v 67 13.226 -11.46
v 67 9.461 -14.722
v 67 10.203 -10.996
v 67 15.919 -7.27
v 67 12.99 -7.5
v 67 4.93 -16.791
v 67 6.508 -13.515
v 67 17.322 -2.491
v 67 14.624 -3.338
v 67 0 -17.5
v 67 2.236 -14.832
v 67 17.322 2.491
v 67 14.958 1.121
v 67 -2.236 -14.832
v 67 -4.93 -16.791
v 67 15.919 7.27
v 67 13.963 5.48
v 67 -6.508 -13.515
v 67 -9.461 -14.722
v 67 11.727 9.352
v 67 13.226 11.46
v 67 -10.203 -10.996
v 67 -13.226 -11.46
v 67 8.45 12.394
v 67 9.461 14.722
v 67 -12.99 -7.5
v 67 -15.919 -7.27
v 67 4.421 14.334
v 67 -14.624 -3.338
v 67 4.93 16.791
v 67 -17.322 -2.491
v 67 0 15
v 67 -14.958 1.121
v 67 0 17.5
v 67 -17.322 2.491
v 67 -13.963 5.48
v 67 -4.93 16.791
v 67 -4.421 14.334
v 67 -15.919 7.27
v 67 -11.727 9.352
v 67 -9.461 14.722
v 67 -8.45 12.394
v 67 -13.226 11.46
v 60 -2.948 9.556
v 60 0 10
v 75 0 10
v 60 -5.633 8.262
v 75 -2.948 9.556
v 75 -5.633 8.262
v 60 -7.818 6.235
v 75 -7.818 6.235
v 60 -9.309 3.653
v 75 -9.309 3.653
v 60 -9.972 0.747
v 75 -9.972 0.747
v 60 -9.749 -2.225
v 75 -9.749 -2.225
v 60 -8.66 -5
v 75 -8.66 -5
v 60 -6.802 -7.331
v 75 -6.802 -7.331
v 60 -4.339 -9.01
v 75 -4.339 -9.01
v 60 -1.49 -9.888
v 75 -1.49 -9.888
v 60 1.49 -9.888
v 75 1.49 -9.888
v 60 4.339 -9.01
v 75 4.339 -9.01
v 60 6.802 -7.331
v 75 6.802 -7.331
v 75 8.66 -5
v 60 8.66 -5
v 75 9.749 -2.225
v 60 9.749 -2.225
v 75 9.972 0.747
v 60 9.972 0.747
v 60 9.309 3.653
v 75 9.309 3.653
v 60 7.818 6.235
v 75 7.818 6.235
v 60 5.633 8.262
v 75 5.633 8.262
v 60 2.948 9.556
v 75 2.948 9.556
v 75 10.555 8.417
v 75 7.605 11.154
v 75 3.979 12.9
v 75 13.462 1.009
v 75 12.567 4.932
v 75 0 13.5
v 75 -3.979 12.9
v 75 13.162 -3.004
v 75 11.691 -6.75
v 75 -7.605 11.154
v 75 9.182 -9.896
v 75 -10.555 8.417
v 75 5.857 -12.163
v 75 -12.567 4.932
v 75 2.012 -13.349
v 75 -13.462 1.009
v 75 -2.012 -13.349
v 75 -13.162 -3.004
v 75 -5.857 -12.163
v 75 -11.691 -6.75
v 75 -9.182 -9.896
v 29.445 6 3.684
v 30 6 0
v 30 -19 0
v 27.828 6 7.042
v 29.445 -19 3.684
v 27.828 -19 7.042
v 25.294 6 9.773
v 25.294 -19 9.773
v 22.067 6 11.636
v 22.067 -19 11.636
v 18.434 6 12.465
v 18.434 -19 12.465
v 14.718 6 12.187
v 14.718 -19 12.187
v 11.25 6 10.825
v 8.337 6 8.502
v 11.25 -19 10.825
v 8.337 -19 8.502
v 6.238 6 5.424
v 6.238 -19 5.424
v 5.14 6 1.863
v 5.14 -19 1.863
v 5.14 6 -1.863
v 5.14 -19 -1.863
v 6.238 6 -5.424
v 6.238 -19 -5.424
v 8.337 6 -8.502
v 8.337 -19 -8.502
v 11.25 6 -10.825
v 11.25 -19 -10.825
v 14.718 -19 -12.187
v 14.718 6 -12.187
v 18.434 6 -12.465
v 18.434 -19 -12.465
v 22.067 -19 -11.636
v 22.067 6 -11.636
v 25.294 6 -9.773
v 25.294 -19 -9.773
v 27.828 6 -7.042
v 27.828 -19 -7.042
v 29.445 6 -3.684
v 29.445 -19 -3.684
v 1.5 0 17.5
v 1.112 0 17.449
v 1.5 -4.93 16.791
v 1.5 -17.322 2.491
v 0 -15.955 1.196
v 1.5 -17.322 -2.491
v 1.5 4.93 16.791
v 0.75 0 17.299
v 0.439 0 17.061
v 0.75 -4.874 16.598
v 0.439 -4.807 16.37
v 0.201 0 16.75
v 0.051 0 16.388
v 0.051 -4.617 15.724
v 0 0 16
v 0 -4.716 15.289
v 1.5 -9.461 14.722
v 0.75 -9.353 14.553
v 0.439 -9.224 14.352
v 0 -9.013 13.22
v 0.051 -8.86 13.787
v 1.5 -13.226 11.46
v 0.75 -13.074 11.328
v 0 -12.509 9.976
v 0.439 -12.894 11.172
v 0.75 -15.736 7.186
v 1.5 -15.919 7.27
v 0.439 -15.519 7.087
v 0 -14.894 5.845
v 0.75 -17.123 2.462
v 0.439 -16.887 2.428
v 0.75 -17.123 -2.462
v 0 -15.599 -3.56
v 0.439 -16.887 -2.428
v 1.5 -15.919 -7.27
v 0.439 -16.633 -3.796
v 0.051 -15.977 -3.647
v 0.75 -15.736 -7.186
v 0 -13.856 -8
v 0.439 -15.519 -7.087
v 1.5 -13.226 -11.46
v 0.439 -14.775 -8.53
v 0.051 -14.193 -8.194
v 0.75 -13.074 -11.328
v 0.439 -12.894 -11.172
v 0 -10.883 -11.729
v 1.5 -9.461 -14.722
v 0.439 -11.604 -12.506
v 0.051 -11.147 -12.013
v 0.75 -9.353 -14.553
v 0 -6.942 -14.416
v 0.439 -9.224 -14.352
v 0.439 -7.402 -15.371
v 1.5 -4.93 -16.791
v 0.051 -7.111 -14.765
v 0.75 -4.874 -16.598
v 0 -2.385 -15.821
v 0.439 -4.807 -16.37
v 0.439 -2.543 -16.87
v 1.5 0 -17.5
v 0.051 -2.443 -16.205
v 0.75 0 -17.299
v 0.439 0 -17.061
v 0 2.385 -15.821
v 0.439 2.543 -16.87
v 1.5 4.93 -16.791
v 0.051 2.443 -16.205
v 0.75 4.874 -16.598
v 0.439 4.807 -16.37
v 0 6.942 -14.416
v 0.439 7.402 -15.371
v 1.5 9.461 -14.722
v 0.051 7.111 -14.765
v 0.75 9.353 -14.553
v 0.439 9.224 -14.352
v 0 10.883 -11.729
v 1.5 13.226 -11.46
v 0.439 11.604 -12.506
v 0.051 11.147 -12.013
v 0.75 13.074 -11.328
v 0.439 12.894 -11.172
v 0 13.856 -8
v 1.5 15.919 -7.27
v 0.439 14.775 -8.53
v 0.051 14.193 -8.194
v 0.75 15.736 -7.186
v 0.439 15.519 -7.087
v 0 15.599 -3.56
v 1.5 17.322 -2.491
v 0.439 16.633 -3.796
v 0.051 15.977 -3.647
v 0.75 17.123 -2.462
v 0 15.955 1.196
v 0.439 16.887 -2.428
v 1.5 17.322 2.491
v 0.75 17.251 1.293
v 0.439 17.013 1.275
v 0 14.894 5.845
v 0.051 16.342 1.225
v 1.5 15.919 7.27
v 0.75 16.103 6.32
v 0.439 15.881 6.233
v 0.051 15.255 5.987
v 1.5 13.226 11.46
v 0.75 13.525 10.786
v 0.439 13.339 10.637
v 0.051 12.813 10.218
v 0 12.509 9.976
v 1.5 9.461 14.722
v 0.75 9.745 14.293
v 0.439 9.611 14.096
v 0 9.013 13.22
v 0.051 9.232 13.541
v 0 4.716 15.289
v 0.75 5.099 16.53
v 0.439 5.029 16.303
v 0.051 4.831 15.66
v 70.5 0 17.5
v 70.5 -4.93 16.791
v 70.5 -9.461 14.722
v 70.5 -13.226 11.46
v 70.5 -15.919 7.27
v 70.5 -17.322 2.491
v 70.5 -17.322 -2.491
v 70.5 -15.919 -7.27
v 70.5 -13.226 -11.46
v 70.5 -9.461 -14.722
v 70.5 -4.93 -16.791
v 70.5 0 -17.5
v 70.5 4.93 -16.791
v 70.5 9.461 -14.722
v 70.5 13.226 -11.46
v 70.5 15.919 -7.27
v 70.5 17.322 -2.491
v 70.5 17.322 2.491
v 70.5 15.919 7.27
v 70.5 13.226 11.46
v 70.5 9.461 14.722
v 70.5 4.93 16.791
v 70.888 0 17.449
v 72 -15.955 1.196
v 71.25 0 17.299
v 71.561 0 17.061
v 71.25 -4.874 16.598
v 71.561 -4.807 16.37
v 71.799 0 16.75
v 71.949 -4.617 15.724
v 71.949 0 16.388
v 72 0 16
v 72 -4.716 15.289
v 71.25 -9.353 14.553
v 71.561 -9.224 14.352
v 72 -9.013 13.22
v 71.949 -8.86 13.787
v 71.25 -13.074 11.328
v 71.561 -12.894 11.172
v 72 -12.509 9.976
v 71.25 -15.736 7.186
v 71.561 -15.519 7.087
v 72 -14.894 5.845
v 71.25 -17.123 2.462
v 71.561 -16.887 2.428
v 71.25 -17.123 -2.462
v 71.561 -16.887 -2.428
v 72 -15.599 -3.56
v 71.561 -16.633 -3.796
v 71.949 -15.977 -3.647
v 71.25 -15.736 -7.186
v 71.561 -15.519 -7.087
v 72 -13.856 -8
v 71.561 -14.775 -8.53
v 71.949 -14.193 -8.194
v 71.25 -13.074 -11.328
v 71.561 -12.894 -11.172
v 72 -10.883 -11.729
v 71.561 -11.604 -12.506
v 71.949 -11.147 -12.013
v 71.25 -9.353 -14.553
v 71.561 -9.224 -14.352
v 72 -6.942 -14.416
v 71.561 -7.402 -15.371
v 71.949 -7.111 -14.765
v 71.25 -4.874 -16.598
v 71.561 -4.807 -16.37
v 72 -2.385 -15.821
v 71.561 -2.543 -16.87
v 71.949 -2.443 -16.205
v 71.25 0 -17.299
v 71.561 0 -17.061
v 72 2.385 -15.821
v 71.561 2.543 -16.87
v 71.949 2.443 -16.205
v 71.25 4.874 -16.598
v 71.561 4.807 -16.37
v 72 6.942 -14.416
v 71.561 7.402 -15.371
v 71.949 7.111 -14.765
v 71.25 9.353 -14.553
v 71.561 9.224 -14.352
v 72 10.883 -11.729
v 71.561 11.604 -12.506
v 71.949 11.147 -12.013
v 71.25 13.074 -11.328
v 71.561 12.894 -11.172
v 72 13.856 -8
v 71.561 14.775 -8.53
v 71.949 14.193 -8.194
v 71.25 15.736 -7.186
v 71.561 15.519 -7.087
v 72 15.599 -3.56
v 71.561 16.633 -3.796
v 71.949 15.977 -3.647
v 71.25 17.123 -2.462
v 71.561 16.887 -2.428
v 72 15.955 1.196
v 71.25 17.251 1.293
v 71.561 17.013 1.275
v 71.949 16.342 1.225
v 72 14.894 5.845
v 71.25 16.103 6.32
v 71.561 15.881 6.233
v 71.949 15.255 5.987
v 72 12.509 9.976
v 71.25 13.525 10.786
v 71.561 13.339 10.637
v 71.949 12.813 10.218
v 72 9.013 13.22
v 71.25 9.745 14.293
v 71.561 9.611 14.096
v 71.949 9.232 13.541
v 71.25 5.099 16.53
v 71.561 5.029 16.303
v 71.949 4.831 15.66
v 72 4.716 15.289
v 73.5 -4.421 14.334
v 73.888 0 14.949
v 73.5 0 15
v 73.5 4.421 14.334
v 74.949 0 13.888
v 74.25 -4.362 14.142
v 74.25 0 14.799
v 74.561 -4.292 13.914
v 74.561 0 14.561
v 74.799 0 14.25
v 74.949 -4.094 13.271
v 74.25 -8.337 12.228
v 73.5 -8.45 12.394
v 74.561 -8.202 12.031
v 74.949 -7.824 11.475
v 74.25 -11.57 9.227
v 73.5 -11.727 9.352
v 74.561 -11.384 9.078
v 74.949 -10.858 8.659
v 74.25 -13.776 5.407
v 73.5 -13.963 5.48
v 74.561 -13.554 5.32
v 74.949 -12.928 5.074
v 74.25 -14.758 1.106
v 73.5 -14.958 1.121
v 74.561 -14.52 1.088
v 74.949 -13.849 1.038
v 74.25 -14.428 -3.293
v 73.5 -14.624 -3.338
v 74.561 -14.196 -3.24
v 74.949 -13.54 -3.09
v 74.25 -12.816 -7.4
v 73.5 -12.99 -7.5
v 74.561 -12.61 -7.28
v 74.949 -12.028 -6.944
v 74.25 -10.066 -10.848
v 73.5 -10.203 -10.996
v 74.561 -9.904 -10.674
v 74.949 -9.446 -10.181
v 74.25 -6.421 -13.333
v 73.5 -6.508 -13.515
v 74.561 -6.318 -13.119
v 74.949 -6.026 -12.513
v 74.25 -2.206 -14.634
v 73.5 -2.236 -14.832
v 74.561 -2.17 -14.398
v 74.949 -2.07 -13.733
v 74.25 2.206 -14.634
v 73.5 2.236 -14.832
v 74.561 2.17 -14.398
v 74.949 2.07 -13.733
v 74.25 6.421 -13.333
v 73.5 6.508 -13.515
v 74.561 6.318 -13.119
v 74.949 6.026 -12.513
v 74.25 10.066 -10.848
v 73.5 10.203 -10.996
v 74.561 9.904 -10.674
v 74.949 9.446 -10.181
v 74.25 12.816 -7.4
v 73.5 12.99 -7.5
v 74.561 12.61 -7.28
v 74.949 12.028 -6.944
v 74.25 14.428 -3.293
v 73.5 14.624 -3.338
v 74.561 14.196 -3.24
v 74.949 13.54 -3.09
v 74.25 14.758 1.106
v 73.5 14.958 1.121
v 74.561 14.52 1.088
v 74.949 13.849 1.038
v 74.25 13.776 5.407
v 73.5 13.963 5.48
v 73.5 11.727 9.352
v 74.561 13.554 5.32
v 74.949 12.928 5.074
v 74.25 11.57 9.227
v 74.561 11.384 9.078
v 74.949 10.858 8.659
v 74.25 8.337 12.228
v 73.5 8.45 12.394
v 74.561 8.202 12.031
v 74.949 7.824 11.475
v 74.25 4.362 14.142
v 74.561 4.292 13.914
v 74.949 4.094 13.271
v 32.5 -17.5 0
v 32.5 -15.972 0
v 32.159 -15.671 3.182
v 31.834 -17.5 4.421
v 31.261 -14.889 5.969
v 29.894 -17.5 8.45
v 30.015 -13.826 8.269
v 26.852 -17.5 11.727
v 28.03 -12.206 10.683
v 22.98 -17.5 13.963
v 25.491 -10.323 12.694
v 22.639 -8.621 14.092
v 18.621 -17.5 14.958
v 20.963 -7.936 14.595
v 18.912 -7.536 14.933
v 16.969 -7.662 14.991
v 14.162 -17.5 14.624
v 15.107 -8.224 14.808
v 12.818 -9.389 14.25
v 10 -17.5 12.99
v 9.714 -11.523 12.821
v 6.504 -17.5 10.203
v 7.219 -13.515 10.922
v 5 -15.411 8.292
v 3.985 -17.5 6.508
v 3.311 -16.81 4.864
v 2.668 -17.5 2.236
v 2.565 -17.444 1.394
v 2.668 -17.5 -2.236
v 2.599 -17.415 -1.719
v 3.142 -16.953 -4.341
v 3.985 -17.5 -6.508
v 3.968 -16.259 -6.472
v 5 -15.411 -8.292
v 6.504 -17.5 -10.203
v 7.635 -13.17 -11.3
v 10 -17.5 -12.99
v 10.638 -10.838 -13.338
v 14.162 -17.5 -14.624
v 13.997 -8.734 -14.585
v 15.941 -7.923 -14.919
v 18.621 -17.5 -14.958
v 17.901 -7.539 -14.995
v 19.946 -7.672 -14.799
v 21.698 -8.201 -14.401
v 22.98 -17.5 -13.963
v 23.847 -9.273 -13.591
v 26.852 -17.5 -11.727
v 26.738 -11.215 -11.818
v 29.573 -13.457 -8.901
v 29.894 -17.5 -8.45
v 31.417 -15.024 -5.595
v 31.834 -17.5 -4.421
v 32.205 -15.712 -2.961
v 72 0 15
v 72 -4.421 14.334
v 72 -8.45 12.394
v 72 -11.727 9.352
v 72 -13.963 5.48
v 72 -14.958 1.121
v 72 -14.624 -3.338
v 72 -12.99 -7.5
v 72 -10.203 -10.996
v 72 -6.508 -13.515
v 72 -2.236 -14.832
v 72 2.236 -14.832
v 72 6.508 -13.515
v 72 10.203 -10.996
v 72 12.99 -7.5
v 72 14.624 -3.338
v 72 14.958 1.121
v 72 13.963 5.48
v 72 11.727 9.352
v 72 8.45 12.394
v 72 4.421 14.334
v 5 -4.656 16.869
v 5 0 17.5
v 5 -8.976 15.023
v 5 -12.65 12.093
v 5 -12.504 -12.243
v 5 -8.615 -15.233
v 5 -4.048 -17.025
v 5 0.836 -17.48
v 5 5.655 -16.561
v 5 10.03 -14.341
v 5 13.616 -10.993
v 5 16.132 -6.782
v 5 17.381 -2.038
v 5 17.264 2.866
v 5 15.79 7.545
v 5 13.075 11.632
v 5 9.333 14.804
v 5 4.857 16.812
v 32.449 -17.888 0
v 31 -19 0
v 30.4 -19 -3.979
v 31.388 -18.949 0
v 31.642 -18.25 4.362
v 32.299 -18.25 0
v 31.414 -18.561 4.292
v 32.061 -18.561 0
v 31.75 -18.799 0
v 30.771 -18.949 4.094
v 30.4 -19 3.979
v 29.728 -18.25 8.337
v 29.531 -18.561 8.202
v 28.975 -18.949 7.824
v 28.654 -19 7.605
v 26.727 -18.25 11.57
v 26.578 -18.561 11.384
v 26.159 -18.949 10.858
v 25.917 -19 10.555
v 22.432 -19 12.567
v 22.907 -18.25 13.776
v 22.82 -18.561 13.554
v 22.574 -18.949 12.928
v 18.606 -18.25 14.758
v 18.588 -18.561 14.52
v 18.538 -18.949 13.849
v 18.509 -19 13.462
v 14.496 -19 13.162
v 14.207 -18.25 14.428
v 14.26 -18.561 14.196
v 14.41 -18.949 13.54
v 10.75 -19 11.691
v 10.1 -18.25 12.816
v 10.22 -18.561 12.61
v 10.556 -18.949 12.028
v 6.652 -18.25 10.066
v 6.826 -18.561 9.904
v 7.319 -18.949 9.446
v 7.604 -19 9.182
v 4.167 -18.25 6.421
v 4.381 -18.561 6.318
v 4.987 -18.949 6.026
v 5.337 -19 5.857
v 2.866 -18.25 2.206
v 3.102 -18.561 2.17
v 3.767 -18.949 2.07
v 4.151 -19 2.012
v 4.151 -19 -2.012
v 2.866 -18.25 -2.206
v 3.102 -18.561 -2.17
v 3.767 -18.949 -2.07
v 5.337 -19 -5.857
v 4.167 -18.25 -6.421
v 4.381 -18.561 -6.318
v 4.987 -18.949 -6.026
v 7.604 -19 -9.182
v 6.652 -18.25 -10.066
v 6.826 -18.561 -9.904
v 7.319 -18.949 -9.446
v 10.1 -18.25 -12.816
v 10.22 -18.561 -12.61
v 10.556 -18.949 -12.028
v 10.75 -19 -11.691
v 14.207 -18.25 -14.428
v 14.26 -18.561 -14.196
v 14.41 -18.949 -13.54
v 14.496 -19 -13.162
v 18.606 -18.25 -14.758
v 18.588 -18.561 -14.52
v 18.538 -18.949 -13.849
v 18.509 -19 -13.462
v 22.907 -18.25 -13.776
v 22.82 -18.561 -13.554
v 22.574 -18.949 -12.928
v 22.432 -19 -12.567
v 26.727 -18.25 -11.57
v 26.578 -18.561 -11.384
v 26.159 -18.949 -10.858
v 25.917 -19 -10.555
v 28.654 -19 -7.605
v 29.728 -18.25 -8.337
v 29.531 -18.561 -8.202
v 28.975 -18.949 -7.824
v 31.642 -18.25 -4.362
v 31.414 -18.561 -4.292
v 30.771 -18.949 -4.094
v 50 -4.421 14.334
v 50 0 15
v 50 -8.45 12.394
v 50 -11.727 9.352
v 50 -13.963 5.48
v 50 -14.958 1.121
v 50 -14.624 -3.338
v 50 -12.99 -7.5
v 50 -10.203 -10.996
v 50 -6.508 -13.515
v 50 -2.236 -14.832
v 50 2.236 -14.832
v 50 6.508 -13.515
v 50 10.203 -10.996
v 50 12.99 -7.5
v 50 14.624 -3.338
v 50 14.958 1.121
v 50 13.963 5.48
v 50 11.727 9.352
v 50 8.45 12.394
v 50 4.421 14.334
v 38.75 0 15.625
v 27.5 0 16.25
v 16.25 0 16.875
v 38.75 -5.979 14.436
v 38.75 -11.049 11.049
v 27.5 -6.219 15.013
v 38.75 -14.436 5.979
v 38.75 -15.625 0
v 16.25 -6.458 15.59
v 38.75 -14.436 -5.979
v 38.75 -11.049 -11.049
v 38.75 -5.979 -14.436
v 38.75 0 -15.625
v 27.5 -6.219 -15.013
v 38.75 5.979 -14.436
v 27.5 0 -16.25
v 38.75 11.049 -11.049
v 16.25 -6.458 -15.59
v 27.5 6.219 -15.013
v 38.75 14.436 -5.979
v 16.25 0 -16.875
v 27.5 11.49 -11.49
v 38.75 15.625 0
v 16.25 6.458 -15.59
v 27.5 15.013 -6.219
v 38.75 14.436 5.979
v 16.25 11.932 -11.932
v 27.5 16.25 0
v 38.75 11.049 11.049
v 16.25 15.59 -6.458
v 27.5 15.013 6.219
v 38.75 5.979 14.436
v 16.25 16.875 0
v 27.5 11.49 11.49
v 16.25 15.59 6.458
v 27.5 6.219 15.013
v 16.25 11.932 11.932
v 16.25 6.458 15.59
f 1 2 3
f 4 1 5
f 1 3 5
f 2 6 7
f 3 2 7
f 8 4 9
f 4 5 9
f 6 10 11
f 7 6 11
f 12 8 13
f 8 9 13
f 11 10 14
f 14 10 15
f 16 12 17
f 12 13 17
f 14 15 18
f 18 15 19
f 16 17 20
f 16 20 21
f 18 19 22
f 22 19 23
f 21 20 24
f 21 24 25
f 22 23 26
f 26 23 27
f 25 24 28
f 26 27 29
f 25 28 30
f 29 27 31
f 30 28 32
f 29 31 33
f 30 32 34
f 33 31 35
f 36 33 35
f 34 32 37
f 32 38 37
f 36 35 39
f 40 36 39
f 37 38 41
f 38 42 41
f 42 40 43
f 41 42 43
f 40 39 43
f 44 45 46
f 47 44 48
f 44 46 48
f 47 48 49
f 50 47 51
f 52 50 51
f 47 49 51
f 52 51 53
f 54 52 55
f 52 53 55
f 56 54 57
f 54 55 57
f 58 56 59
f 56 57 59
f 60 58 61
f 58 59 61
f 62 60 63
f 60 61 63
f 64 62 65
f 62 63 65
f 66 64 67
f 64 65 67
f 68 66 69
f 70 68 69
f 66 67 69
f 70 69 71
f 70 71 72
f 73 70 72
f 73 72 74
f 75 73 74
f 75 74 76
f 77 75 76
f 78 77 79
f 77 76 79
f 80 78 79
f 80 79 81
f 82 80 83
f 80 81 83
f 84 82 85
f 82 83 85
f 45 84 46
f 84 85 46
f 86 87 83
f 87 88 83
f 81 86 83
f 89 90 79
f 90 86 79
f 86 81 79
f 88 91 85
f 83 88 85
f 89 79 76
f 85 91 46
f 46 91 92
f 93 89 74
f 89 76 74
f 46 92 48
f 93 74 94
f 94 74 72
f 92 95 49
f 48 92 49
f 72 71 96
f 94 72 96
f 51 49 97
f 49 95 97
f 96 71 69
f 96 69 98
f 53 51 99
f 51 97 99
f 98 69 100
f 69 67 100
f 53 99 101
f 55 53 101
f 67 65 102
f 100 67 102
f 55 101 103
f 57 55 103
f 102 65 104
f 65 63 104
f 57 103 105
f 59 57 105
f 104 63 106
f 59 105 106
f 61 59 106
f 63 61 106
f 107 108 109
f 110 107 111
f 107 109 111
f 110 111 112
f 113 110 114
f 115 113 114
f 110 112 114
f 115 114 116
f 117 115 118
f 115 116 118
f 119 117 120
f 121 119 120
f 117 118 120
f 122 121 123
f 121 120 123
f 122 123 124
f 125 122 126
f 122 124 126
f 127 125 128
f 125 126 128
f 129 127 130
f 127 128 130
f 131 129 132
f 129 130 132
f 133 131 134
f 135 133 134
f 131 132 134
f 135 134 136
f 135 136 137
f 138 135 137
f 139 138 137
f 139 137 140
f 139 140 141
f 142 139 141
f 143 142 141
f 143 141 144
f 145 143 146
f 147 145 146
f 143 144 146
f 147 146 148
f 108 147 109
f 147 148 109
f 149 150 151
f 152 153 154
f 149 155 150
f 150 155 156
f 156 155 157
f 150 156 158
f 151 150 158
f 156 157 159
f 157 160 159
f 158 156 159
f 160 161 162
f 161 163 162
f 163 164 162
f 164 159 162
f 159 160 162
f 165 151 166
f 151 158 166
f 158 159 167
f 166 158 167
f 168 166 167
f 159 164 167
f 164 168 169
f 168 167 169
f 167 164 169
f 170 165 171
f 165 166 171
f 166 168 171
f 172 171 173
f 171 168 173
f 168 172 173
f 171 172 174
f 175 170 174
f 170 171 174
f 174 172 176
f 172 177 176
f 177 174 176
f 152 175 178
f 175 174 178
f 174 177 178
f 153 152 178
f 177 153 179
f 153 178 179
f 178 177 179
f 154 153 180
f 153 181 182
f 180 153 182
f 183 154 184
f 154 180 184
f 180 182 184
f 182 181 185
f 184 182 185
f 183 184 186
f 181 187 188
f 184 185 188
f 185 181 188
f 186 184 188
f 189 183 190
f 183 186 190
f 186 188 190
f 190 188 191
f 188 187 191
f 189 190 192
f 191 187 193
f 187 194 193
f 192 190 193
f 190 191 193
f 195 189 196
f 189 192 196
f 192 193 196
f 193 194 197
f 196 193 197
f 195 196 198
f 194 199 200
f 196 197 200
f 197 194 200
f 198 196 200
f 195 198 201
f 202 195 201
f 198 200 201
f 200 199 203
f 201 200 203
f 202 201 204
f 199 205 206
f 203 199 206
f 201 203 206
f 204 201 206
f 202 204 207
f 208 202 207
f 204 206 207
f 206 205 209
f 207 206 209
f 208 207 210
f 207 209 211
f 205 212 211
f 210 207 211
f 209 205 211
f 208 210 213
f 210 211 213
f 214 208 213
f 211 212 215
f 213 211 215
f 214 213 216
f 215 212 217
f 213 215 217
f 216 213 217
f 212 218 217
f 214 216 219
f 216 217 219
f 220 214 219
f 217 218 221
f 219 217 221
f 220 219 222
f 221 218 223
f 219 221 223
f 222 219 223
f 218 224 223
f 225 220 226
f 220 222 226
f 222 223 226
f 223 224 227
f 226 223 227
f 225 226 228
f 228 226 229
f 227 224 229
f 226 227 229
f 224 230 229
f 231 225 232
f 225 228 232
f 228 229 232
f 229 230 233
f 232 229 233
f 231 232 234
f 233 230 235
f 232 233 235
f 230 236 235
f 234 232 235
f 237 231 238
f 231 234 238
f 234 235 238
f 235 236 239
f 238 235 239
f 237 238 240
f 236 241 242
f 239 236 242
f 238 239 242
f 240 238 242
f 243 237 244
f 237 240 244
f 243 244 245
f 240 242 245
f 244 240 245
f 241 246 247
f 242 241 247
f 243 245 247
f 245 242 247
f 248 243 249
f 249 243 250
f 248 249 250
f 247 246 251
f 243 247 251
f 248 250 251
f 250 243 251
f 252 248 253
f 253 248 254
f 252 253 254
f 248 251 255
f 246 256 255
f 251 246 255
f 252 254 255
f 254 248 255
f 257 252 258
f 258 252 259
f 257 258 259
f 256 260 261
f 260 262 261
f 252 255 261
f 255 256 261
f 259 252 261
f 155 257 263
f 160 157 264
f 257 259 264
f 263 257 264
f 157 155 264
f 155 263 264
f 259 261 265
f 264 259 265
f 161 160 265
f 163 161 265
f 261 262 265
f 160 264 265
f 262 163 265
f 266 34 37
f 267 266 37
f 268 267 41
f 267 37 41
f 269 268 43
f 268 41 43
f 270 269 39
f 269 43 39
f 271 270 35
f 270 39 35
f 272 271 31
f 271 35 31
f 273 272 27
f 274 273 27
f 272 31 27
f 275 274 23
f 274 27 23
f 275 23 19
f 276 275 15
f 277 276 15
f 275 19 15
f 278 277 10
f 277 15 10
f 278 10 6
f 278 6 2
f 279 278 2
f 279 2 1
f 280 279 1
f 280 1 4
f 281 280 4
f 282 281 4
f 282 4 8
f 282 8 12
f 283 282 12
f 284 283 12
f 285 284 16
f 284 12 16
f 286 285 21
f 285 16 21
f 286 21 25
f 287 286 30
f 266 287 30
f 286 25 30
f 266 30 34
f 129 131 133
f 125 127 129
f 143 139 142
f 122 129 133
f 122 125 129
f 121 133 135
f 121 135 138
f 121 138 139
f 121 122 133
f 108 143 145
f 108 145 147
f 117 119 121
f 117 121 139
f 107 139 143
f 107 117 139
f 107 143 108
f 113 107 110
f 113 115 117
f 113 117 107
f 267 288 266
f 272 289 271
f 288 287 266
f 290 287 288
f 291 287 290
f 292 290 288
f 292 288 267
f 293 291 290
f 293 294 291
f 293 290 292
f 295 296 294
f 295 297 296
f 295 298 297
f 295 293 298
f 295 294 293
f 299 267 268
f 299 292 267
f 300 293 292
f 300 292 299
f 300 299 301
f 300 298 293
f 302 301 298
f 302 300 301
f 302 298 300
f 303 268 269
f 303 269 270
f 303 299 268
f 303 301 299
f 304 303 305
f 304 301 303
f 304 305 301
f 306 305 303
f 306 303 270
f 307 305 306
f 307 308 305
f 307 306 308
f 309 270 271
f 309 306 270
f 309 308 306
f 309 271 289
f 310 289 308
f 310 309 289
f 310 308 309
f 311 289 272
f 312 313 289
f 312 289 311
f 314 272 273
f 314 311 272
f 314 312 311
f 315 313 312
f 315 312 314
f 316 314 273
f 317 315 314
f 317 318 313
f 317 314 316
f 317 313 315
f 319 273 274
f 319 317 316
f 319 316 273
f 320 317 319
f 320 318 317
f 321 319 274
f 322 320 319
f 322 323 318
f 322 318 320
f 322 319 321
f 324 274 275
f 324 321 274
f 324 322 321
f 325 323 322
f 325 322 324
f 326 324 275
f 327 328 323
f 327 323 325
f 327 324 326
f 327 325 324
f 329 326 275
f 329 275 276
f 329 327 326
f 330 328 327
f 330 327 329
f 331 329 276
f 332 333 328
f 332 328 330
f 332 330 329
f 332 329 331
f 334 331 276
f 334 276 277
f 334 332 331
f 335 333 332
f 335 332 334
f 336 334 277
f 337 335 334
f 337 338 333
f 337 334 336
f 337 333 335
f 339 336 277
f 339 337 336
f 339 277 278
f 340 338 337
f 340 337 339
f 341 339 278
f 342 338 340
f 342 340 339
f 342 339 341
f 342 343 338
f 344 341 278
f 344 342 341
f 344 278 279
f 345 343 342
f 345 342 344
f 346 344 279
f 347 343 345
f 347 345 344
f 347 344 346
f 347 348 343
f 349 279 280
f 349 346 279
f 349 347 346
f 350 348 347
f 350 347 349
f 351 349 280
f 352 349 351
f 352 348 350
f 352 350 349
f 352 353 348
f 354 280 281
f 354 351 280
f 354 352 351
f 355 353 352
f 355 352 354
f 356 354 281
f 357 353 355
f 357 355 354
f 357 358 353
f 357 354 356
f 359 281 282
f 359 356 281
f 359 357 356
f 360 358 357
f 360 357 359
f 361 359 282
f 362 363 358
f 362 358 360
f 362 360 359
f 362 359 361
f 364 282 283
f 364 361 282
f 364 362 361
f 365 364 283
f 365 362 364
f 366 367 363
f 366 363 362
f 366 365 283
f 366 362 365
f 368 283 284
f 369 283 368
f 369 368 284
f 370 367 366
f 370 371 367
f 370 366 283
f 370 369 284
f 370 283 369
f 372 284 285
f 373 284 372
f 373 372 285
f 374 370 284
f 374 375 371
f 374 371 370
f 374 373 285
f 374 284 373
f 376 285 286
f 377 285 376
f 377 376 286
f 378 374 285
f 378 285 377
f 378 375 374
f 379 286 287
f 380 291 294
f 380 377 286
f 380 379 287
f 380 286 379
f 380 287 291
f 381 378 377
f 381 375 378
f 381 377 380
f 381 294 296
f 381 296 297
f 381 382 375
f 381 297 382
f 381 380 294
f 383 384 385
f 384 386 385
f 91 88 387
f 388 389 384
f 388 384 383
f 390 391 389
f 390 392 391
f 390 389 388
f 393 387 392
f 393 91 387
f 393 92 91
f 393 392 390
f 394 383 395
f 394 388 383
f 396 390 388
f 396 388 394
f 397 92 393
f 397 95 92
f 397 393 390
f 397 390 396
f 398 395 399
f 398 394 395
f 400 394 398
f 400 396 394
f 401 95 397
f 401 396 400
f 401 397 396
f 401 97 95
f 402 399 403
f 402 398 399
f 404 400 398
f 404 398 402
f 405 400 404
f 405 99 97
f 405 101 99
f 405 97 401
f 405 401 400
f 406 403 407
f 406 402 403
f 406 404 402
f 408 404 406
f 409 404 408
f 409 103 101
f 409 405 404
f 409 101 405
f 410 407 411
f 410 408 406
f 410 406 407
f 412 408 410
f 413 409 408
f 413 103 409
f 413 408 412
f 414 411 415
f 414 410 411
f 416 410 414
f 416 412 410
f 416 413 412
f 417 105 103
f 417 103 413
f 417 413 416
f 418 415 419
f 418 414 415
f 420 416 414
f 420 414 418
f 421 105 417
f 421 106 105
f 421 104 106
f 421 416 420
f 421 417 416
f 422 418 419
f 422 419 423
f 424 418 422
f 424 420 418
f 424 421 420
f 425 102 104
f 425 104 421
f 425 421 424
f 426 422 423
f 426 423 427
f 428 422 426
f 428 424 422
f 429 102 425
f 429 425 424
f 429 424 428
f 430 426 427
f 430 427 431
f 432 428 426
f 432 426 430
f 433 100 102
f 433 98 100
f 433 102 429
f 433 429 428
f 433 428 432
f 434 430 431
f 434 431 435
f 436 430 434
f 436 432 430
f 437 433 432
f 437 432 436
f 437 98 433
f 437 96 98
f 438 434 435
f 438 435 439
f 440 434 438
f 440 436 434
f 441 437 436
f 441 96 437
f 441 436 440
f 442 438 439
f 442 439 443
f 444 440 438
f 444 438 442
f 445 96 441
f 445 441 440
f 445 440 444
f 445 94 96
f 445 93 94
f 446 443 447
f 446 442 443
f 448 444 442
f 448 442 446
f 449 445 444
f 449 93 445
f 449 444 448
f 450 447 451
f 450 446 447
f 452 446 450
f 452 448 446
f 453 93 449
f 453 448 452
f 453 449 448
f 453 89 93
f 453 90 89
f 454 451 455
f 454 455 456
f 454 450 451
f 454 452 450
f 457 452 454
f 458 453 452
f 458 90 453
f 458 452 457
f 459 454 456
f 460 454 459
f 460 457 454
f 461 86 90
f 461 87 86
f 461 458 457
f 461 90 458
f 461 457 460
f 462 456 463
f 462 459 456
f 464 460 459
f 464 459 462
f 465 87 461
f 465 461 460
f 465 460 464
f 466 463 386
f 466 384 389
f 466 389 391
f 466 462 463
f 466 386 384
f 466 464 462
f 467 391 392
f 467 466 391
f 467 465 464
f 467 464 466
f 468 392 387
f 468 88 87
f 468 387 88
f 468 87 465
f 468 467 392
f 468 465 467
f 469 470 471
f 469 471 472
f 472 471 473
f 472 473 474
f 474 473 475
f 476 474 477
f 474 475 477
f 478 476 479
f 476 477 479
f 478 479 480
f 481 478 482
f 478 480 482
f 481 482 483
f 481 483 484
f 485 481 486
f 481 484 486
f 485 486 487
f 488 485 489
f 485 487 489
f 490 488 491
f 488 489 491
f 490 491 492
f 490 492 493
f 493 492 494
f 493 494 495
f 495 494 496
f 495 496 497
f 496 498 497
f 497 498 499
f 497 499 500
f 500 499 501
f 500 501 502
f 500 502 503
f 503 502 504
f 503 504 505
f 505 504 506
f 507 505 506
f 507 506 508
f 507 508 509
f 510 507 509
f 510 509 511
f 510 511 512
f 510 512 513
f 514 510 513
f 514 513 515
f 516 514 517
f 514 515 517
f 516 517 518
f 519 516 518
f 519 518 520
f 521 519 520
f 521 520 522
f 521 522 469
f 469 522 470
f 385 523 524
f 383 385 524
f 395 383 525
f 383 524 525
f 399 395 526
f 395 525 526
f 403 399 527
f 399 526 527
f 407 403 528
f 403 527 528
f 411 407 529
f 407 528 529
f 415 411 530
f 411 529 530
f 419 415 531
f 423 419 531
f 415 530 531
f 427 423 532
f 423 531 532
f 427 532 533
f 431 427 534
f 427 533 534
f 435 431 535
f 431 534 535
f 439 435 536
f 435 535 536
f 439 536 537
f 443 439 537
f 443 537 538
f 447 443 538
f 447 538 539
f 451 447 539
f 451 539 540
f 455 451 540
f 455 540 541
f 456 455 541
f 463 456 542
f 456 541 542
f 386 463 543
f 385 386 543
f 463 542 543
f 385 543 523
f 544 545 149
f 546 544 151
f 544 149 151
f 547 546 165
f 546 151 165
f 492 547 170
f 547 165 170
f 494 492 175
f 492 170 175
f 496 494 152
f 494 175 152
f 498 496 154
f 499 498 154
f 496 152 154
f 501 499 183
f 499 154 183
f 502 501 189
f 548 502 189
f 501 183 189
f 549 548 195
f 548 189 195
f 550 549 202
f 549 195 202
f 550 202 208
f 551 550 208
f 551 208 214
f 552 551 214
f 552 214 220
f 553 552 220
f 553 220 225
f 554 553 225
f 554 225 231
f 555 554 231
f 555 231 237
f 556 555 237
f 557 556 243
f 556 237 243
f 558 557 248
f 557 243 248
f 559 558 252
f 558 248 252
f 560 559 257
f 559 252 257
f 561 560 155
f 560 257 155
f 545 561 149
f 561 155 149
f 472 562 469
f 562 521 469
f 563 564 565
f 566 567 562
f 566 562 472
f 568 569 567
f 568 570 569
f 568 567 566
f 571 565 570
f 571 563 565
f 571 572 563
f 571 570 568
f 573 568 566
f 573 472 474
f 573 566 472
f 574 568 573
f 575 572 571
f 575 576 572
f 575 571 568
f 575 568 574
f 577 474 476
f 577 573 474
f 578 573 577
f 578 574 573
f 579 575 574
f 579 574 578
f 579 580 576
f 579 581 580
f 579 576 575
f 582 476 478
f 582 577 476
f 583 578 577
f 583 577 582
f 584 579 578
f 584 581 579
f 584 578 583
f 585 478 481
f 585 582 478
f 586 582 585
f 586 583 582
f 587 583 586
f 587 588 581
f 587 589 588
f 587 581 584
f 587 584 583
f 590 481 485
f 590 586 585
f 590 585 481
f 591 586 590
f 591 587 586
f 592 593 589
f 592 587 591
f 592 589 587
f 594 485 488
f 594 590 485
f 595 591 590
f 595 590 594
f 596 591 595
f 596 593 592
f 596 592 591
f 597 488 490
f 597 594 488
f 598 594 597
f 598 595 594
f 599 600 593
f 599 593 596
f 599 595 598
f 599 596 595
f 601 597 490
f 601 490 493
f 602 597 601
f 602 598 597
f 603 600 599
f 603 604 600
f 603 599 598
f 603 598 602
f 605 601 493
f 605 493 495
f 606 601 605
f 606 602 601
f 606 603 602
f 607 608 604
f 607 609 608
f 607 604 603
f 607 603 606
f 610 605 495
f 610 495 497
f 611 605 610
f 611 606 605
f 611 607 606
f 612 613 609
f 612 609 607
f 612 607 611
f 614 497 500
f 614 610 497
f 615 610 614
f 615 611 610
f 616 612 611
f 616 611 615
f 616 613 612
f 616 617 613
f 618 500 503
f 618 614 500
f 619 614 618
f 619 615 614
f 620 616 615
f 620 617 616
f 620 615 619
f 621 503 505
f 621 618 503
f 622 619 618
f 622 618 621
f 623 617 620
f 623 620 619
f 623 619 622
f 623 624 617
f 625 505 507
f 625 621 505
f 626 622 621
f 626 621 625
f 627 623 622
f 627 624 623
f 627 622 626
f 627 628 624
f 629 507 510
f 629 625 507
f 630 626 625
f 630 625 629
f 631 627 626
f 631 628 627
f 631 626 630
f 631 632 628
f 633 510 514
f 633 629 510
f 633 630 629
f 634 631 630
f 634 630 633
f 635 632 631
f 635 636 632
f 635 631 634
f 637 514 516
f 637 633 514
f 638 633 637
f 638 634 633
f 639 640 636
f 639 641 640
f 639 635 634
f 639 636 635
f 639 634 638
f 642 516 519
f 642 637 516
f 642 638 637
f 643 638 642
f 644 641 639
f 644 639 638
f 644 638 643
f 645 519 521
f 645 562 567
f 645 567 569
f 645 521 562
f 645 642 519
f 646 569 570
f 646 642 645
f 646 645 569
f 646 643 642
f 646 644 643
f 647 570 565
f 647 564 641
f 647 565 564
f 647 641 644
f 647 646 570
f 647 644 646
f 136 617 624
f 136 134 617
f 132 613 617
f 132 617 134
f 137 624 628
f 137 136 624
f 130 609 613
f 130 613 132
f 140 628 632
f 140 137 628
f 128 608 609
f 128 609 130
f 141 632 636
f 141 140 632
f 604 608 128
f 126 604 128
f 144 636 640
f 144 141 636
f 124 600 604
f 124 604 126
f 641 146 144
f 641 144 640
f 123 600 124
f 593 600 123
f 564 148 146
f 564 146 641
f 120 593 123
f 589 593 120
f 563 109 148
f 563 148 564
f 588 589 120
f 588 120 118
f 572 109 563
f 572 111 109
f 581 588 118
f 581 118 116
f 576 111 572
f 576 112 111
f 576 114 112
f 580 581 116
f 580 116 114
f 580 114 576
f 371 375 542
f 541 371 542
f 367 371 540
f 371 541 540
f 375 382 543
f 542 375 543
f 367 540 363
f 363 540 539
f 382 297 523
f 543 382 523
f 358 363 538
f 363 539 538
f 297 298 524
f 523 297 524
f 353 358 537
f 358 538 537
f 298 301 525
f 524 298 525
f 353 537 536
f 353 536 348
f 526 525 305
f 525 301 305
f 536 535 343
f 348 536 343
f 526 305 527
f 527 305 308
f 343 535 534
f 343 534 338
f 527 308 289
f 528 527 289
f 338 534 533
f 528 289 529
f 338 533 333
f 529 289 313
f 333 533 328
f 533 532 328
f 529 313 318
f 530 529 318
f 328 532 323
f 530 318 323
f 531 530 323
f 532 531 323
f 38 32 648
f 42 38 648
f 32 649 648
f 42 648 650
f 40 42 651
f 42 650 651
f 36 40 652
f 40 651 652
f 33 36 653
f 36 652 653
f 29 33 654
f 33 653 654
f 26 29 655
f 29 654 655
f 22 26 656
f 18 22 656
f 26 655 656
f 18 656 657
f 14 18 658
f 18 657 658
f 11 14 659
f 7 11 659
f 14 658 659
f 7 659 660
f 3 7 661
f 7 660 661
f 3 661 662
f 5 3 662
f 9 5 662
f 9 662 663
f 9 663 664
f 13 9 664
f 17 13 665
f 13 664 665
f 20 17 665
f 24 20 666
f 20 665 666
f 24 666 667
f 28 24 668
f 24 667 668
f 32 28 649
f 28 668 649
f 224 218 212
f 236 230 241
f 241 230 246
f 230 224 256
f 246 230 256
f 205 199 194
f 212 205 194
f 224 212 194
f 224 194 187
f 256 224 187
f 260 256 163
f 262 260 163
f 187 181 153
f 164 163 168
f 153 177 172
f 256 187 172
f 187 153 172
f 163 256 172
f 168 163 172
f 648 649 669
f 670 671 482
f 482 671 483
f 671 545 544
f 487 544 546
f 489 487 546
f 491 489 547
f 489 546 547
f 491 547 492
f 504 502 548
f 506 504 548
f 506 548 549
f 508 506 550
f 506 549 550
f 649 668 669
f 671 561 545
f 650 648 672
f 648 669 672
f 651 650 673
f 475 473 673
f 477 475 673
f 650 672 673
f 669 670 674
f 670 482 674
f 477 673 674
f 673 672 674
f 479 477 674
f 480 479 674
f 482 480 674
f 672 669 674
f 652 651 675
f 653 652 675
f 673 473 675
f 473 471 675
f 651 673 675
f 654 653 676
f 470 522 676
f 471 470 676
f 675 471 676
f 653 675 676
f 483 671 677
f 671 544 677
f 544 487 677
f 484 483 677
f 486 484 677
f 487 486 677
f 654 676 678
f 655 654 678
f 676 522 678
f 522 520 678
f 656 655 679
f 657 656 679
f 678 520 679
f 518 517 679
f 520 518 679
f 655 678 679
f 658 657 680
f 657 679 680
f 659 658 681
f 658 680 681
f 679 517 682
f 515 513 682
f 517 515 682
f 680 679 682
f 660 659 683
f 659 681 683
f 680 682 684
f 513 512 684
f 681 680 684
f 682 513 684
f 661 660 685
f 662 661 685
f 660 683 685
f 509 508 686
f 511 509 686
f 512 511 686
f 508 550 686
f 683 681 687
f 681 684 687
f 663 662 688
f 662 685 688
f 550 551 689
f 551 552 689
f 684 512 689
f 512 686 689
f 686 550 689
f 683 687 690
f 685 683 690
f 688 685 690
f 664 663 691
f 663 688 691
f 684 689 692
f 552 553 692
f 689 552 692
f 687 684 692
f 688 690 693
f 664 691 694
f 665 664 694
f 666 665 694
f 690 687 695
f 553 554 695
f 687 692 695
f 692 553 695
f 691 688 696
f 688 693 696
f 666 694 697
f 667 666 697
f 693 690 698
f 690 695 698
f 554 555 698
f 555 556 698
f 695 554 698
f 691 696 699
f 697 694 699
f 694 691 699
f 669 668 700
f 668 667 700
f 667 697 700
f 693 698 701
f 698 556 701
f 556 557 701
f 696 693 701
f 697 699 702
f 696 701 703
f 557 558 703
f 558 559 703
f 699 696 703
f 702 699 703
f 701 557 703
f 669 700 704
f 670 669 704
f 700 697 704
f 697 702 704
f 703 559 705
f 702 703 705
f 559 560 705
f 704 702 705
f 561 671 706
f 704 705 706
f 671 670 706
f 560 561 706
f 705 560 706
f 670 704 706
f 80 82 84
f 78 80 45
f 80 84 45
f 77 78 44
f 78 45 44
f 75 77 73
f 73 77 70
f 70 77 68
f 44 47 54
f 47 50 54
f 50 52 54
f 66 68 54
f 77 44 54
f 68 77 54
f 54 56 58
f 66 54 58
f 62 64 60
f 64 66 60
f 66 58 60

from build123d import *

# Parameters (mm, degrees)
F2_R     = 15
F3_DEPTH = 19
F4_R     = 12.5
F5_DEPTH = 25
F6_R     = 1.5
F7_R     = 1.5


with BuildPart() as f1:
    # F0 (on Front) → F1 (revolve)
    with BuildSketch(Plane.XZ):
        Polygon((0, 17.5), (0, 0), (60, 0), (60, 10), (75, 10), (75, 15), (72, 15), (72, 17.5), (67, 17.5), (67, 15), (50, 15), (5, 17.5), align=None)
    revolve(axis=Axis((30, 0, 0), (1, 0, 0)))

    # F2 (on Front) → F3 (join)
    with BuildSketch(Plane.XZ):
        with Locations((17.5, 0)):
            Circle(F2_R)
    extrude(amount=F3_DEPTH)

    # F4 (on face) → F5 (cut)
    with BuildSketch(Plane.XZ.offset(19)):
        with Locations((17.5, 0)):
            Circle(F4_R)
    extrude(amount=-F5_DEPTH, mode=Mode.SUBTRACT)

    # F6
    f6_edges = [f1.edges().sort_by_distance(p)[0] for p in [
        (72, 0, -17.5),
        (75, 0, -15),
        (0, 0, -17.5),
    ]]
    fillet(f6_edges, radius=F6_R)

    # F7
    f7_edges = [f1.edges().sort_by_distance(p)[0] for p in [
        (2.5, -19, 0),
    ]]
    fillet(f7_edges, radius=F7_R)


solid = f1.part
